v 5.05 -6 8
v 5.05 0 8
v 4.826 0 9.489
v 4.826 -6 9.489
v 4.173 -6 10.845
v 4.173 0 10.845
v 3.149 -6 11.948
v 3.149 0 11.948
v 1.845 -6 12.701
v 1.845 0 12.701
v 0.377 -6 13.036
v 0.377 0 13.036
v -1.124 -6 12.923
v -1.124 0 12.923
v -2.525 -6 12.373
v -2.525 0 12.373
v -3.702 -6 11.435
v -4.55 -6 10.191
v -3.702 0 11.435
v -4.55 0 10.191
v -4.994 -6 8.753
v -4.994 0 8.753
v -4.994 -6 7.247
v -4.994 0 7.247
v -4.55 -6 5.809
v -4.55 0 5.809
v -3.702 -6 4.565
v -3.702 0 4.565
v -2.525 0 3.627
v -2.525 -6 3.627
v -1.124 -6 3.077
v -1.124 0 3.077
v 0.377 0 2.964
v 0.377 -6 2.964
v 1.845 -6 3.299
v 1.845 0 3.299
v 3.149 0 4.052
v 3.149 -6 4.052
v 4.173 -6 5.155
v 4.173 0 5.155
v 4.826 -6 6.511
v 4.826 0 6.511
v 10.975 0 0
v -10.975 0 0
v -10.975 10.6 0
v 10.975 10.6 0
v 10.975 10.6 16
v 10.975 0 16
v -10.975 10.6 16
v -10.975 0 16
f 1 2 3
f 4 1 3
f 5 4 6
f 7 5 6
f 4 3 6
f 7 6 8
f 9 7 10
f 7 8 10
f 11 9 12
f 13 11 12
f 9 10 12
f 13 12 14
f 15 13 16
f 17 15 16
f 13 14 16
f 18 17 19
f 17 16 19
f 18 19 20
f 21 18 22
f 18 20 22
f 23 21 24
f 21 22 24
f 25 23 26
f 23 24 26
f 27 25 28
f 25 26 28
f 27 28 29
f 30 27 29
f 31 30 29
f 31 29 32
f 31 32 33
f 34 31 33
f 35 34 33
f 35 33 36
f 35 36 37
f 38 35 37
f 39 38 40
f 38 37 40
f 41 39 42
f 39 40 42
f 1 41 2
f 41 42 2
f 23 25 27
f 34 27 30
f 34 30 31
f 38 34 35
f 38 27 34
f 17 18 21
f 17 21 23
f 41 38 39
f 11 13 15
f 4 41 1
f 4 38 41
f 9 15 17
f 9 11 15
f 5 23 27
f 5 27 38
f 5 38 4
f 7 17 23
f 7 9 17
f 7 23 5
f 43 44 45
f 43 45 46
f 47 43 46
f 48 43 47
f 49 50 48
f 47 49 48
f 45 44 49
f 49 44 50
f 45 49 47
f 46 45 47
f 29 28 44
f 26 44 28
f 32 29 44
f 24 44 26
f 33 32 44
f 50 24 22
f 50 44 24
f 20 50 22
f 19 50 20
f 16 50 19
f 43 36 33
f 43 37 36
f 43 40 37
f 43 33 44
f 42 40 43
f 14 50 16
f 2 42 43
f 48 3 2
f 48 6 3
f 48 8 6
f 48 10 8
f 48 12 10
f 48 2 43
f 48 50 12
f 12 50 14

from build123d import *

# Parameters (mm, degrees)
F0_R     = 5.05
F1_DEPTH = 6
F0_W     = 21.95
F0_H     = 16
F2_DEPTH = 10.6


with BuildPart() as f1:
    # F0 (on Front) → F1 (new body)
    with BuildSketch(Plane.XZ):
        with Locations((0, 8)):
            Circle(F0_R)
    extrude(amount=F1_DEPTH)

    # F0 (on Front) → F2 (join)
    with BuildSketch(Plane.XZ):
        with Locations((0, 8)):
            Rectangle(F0_W, F0_H)
        with Locations((0, 8)):
            Circle(F0_R, mode=Mode.SUBTRACT)
        with Locations((0, 8)):
            Circle(F0_R)
    extrude(amount=-F2_DEPTH)


solid = f1.part
